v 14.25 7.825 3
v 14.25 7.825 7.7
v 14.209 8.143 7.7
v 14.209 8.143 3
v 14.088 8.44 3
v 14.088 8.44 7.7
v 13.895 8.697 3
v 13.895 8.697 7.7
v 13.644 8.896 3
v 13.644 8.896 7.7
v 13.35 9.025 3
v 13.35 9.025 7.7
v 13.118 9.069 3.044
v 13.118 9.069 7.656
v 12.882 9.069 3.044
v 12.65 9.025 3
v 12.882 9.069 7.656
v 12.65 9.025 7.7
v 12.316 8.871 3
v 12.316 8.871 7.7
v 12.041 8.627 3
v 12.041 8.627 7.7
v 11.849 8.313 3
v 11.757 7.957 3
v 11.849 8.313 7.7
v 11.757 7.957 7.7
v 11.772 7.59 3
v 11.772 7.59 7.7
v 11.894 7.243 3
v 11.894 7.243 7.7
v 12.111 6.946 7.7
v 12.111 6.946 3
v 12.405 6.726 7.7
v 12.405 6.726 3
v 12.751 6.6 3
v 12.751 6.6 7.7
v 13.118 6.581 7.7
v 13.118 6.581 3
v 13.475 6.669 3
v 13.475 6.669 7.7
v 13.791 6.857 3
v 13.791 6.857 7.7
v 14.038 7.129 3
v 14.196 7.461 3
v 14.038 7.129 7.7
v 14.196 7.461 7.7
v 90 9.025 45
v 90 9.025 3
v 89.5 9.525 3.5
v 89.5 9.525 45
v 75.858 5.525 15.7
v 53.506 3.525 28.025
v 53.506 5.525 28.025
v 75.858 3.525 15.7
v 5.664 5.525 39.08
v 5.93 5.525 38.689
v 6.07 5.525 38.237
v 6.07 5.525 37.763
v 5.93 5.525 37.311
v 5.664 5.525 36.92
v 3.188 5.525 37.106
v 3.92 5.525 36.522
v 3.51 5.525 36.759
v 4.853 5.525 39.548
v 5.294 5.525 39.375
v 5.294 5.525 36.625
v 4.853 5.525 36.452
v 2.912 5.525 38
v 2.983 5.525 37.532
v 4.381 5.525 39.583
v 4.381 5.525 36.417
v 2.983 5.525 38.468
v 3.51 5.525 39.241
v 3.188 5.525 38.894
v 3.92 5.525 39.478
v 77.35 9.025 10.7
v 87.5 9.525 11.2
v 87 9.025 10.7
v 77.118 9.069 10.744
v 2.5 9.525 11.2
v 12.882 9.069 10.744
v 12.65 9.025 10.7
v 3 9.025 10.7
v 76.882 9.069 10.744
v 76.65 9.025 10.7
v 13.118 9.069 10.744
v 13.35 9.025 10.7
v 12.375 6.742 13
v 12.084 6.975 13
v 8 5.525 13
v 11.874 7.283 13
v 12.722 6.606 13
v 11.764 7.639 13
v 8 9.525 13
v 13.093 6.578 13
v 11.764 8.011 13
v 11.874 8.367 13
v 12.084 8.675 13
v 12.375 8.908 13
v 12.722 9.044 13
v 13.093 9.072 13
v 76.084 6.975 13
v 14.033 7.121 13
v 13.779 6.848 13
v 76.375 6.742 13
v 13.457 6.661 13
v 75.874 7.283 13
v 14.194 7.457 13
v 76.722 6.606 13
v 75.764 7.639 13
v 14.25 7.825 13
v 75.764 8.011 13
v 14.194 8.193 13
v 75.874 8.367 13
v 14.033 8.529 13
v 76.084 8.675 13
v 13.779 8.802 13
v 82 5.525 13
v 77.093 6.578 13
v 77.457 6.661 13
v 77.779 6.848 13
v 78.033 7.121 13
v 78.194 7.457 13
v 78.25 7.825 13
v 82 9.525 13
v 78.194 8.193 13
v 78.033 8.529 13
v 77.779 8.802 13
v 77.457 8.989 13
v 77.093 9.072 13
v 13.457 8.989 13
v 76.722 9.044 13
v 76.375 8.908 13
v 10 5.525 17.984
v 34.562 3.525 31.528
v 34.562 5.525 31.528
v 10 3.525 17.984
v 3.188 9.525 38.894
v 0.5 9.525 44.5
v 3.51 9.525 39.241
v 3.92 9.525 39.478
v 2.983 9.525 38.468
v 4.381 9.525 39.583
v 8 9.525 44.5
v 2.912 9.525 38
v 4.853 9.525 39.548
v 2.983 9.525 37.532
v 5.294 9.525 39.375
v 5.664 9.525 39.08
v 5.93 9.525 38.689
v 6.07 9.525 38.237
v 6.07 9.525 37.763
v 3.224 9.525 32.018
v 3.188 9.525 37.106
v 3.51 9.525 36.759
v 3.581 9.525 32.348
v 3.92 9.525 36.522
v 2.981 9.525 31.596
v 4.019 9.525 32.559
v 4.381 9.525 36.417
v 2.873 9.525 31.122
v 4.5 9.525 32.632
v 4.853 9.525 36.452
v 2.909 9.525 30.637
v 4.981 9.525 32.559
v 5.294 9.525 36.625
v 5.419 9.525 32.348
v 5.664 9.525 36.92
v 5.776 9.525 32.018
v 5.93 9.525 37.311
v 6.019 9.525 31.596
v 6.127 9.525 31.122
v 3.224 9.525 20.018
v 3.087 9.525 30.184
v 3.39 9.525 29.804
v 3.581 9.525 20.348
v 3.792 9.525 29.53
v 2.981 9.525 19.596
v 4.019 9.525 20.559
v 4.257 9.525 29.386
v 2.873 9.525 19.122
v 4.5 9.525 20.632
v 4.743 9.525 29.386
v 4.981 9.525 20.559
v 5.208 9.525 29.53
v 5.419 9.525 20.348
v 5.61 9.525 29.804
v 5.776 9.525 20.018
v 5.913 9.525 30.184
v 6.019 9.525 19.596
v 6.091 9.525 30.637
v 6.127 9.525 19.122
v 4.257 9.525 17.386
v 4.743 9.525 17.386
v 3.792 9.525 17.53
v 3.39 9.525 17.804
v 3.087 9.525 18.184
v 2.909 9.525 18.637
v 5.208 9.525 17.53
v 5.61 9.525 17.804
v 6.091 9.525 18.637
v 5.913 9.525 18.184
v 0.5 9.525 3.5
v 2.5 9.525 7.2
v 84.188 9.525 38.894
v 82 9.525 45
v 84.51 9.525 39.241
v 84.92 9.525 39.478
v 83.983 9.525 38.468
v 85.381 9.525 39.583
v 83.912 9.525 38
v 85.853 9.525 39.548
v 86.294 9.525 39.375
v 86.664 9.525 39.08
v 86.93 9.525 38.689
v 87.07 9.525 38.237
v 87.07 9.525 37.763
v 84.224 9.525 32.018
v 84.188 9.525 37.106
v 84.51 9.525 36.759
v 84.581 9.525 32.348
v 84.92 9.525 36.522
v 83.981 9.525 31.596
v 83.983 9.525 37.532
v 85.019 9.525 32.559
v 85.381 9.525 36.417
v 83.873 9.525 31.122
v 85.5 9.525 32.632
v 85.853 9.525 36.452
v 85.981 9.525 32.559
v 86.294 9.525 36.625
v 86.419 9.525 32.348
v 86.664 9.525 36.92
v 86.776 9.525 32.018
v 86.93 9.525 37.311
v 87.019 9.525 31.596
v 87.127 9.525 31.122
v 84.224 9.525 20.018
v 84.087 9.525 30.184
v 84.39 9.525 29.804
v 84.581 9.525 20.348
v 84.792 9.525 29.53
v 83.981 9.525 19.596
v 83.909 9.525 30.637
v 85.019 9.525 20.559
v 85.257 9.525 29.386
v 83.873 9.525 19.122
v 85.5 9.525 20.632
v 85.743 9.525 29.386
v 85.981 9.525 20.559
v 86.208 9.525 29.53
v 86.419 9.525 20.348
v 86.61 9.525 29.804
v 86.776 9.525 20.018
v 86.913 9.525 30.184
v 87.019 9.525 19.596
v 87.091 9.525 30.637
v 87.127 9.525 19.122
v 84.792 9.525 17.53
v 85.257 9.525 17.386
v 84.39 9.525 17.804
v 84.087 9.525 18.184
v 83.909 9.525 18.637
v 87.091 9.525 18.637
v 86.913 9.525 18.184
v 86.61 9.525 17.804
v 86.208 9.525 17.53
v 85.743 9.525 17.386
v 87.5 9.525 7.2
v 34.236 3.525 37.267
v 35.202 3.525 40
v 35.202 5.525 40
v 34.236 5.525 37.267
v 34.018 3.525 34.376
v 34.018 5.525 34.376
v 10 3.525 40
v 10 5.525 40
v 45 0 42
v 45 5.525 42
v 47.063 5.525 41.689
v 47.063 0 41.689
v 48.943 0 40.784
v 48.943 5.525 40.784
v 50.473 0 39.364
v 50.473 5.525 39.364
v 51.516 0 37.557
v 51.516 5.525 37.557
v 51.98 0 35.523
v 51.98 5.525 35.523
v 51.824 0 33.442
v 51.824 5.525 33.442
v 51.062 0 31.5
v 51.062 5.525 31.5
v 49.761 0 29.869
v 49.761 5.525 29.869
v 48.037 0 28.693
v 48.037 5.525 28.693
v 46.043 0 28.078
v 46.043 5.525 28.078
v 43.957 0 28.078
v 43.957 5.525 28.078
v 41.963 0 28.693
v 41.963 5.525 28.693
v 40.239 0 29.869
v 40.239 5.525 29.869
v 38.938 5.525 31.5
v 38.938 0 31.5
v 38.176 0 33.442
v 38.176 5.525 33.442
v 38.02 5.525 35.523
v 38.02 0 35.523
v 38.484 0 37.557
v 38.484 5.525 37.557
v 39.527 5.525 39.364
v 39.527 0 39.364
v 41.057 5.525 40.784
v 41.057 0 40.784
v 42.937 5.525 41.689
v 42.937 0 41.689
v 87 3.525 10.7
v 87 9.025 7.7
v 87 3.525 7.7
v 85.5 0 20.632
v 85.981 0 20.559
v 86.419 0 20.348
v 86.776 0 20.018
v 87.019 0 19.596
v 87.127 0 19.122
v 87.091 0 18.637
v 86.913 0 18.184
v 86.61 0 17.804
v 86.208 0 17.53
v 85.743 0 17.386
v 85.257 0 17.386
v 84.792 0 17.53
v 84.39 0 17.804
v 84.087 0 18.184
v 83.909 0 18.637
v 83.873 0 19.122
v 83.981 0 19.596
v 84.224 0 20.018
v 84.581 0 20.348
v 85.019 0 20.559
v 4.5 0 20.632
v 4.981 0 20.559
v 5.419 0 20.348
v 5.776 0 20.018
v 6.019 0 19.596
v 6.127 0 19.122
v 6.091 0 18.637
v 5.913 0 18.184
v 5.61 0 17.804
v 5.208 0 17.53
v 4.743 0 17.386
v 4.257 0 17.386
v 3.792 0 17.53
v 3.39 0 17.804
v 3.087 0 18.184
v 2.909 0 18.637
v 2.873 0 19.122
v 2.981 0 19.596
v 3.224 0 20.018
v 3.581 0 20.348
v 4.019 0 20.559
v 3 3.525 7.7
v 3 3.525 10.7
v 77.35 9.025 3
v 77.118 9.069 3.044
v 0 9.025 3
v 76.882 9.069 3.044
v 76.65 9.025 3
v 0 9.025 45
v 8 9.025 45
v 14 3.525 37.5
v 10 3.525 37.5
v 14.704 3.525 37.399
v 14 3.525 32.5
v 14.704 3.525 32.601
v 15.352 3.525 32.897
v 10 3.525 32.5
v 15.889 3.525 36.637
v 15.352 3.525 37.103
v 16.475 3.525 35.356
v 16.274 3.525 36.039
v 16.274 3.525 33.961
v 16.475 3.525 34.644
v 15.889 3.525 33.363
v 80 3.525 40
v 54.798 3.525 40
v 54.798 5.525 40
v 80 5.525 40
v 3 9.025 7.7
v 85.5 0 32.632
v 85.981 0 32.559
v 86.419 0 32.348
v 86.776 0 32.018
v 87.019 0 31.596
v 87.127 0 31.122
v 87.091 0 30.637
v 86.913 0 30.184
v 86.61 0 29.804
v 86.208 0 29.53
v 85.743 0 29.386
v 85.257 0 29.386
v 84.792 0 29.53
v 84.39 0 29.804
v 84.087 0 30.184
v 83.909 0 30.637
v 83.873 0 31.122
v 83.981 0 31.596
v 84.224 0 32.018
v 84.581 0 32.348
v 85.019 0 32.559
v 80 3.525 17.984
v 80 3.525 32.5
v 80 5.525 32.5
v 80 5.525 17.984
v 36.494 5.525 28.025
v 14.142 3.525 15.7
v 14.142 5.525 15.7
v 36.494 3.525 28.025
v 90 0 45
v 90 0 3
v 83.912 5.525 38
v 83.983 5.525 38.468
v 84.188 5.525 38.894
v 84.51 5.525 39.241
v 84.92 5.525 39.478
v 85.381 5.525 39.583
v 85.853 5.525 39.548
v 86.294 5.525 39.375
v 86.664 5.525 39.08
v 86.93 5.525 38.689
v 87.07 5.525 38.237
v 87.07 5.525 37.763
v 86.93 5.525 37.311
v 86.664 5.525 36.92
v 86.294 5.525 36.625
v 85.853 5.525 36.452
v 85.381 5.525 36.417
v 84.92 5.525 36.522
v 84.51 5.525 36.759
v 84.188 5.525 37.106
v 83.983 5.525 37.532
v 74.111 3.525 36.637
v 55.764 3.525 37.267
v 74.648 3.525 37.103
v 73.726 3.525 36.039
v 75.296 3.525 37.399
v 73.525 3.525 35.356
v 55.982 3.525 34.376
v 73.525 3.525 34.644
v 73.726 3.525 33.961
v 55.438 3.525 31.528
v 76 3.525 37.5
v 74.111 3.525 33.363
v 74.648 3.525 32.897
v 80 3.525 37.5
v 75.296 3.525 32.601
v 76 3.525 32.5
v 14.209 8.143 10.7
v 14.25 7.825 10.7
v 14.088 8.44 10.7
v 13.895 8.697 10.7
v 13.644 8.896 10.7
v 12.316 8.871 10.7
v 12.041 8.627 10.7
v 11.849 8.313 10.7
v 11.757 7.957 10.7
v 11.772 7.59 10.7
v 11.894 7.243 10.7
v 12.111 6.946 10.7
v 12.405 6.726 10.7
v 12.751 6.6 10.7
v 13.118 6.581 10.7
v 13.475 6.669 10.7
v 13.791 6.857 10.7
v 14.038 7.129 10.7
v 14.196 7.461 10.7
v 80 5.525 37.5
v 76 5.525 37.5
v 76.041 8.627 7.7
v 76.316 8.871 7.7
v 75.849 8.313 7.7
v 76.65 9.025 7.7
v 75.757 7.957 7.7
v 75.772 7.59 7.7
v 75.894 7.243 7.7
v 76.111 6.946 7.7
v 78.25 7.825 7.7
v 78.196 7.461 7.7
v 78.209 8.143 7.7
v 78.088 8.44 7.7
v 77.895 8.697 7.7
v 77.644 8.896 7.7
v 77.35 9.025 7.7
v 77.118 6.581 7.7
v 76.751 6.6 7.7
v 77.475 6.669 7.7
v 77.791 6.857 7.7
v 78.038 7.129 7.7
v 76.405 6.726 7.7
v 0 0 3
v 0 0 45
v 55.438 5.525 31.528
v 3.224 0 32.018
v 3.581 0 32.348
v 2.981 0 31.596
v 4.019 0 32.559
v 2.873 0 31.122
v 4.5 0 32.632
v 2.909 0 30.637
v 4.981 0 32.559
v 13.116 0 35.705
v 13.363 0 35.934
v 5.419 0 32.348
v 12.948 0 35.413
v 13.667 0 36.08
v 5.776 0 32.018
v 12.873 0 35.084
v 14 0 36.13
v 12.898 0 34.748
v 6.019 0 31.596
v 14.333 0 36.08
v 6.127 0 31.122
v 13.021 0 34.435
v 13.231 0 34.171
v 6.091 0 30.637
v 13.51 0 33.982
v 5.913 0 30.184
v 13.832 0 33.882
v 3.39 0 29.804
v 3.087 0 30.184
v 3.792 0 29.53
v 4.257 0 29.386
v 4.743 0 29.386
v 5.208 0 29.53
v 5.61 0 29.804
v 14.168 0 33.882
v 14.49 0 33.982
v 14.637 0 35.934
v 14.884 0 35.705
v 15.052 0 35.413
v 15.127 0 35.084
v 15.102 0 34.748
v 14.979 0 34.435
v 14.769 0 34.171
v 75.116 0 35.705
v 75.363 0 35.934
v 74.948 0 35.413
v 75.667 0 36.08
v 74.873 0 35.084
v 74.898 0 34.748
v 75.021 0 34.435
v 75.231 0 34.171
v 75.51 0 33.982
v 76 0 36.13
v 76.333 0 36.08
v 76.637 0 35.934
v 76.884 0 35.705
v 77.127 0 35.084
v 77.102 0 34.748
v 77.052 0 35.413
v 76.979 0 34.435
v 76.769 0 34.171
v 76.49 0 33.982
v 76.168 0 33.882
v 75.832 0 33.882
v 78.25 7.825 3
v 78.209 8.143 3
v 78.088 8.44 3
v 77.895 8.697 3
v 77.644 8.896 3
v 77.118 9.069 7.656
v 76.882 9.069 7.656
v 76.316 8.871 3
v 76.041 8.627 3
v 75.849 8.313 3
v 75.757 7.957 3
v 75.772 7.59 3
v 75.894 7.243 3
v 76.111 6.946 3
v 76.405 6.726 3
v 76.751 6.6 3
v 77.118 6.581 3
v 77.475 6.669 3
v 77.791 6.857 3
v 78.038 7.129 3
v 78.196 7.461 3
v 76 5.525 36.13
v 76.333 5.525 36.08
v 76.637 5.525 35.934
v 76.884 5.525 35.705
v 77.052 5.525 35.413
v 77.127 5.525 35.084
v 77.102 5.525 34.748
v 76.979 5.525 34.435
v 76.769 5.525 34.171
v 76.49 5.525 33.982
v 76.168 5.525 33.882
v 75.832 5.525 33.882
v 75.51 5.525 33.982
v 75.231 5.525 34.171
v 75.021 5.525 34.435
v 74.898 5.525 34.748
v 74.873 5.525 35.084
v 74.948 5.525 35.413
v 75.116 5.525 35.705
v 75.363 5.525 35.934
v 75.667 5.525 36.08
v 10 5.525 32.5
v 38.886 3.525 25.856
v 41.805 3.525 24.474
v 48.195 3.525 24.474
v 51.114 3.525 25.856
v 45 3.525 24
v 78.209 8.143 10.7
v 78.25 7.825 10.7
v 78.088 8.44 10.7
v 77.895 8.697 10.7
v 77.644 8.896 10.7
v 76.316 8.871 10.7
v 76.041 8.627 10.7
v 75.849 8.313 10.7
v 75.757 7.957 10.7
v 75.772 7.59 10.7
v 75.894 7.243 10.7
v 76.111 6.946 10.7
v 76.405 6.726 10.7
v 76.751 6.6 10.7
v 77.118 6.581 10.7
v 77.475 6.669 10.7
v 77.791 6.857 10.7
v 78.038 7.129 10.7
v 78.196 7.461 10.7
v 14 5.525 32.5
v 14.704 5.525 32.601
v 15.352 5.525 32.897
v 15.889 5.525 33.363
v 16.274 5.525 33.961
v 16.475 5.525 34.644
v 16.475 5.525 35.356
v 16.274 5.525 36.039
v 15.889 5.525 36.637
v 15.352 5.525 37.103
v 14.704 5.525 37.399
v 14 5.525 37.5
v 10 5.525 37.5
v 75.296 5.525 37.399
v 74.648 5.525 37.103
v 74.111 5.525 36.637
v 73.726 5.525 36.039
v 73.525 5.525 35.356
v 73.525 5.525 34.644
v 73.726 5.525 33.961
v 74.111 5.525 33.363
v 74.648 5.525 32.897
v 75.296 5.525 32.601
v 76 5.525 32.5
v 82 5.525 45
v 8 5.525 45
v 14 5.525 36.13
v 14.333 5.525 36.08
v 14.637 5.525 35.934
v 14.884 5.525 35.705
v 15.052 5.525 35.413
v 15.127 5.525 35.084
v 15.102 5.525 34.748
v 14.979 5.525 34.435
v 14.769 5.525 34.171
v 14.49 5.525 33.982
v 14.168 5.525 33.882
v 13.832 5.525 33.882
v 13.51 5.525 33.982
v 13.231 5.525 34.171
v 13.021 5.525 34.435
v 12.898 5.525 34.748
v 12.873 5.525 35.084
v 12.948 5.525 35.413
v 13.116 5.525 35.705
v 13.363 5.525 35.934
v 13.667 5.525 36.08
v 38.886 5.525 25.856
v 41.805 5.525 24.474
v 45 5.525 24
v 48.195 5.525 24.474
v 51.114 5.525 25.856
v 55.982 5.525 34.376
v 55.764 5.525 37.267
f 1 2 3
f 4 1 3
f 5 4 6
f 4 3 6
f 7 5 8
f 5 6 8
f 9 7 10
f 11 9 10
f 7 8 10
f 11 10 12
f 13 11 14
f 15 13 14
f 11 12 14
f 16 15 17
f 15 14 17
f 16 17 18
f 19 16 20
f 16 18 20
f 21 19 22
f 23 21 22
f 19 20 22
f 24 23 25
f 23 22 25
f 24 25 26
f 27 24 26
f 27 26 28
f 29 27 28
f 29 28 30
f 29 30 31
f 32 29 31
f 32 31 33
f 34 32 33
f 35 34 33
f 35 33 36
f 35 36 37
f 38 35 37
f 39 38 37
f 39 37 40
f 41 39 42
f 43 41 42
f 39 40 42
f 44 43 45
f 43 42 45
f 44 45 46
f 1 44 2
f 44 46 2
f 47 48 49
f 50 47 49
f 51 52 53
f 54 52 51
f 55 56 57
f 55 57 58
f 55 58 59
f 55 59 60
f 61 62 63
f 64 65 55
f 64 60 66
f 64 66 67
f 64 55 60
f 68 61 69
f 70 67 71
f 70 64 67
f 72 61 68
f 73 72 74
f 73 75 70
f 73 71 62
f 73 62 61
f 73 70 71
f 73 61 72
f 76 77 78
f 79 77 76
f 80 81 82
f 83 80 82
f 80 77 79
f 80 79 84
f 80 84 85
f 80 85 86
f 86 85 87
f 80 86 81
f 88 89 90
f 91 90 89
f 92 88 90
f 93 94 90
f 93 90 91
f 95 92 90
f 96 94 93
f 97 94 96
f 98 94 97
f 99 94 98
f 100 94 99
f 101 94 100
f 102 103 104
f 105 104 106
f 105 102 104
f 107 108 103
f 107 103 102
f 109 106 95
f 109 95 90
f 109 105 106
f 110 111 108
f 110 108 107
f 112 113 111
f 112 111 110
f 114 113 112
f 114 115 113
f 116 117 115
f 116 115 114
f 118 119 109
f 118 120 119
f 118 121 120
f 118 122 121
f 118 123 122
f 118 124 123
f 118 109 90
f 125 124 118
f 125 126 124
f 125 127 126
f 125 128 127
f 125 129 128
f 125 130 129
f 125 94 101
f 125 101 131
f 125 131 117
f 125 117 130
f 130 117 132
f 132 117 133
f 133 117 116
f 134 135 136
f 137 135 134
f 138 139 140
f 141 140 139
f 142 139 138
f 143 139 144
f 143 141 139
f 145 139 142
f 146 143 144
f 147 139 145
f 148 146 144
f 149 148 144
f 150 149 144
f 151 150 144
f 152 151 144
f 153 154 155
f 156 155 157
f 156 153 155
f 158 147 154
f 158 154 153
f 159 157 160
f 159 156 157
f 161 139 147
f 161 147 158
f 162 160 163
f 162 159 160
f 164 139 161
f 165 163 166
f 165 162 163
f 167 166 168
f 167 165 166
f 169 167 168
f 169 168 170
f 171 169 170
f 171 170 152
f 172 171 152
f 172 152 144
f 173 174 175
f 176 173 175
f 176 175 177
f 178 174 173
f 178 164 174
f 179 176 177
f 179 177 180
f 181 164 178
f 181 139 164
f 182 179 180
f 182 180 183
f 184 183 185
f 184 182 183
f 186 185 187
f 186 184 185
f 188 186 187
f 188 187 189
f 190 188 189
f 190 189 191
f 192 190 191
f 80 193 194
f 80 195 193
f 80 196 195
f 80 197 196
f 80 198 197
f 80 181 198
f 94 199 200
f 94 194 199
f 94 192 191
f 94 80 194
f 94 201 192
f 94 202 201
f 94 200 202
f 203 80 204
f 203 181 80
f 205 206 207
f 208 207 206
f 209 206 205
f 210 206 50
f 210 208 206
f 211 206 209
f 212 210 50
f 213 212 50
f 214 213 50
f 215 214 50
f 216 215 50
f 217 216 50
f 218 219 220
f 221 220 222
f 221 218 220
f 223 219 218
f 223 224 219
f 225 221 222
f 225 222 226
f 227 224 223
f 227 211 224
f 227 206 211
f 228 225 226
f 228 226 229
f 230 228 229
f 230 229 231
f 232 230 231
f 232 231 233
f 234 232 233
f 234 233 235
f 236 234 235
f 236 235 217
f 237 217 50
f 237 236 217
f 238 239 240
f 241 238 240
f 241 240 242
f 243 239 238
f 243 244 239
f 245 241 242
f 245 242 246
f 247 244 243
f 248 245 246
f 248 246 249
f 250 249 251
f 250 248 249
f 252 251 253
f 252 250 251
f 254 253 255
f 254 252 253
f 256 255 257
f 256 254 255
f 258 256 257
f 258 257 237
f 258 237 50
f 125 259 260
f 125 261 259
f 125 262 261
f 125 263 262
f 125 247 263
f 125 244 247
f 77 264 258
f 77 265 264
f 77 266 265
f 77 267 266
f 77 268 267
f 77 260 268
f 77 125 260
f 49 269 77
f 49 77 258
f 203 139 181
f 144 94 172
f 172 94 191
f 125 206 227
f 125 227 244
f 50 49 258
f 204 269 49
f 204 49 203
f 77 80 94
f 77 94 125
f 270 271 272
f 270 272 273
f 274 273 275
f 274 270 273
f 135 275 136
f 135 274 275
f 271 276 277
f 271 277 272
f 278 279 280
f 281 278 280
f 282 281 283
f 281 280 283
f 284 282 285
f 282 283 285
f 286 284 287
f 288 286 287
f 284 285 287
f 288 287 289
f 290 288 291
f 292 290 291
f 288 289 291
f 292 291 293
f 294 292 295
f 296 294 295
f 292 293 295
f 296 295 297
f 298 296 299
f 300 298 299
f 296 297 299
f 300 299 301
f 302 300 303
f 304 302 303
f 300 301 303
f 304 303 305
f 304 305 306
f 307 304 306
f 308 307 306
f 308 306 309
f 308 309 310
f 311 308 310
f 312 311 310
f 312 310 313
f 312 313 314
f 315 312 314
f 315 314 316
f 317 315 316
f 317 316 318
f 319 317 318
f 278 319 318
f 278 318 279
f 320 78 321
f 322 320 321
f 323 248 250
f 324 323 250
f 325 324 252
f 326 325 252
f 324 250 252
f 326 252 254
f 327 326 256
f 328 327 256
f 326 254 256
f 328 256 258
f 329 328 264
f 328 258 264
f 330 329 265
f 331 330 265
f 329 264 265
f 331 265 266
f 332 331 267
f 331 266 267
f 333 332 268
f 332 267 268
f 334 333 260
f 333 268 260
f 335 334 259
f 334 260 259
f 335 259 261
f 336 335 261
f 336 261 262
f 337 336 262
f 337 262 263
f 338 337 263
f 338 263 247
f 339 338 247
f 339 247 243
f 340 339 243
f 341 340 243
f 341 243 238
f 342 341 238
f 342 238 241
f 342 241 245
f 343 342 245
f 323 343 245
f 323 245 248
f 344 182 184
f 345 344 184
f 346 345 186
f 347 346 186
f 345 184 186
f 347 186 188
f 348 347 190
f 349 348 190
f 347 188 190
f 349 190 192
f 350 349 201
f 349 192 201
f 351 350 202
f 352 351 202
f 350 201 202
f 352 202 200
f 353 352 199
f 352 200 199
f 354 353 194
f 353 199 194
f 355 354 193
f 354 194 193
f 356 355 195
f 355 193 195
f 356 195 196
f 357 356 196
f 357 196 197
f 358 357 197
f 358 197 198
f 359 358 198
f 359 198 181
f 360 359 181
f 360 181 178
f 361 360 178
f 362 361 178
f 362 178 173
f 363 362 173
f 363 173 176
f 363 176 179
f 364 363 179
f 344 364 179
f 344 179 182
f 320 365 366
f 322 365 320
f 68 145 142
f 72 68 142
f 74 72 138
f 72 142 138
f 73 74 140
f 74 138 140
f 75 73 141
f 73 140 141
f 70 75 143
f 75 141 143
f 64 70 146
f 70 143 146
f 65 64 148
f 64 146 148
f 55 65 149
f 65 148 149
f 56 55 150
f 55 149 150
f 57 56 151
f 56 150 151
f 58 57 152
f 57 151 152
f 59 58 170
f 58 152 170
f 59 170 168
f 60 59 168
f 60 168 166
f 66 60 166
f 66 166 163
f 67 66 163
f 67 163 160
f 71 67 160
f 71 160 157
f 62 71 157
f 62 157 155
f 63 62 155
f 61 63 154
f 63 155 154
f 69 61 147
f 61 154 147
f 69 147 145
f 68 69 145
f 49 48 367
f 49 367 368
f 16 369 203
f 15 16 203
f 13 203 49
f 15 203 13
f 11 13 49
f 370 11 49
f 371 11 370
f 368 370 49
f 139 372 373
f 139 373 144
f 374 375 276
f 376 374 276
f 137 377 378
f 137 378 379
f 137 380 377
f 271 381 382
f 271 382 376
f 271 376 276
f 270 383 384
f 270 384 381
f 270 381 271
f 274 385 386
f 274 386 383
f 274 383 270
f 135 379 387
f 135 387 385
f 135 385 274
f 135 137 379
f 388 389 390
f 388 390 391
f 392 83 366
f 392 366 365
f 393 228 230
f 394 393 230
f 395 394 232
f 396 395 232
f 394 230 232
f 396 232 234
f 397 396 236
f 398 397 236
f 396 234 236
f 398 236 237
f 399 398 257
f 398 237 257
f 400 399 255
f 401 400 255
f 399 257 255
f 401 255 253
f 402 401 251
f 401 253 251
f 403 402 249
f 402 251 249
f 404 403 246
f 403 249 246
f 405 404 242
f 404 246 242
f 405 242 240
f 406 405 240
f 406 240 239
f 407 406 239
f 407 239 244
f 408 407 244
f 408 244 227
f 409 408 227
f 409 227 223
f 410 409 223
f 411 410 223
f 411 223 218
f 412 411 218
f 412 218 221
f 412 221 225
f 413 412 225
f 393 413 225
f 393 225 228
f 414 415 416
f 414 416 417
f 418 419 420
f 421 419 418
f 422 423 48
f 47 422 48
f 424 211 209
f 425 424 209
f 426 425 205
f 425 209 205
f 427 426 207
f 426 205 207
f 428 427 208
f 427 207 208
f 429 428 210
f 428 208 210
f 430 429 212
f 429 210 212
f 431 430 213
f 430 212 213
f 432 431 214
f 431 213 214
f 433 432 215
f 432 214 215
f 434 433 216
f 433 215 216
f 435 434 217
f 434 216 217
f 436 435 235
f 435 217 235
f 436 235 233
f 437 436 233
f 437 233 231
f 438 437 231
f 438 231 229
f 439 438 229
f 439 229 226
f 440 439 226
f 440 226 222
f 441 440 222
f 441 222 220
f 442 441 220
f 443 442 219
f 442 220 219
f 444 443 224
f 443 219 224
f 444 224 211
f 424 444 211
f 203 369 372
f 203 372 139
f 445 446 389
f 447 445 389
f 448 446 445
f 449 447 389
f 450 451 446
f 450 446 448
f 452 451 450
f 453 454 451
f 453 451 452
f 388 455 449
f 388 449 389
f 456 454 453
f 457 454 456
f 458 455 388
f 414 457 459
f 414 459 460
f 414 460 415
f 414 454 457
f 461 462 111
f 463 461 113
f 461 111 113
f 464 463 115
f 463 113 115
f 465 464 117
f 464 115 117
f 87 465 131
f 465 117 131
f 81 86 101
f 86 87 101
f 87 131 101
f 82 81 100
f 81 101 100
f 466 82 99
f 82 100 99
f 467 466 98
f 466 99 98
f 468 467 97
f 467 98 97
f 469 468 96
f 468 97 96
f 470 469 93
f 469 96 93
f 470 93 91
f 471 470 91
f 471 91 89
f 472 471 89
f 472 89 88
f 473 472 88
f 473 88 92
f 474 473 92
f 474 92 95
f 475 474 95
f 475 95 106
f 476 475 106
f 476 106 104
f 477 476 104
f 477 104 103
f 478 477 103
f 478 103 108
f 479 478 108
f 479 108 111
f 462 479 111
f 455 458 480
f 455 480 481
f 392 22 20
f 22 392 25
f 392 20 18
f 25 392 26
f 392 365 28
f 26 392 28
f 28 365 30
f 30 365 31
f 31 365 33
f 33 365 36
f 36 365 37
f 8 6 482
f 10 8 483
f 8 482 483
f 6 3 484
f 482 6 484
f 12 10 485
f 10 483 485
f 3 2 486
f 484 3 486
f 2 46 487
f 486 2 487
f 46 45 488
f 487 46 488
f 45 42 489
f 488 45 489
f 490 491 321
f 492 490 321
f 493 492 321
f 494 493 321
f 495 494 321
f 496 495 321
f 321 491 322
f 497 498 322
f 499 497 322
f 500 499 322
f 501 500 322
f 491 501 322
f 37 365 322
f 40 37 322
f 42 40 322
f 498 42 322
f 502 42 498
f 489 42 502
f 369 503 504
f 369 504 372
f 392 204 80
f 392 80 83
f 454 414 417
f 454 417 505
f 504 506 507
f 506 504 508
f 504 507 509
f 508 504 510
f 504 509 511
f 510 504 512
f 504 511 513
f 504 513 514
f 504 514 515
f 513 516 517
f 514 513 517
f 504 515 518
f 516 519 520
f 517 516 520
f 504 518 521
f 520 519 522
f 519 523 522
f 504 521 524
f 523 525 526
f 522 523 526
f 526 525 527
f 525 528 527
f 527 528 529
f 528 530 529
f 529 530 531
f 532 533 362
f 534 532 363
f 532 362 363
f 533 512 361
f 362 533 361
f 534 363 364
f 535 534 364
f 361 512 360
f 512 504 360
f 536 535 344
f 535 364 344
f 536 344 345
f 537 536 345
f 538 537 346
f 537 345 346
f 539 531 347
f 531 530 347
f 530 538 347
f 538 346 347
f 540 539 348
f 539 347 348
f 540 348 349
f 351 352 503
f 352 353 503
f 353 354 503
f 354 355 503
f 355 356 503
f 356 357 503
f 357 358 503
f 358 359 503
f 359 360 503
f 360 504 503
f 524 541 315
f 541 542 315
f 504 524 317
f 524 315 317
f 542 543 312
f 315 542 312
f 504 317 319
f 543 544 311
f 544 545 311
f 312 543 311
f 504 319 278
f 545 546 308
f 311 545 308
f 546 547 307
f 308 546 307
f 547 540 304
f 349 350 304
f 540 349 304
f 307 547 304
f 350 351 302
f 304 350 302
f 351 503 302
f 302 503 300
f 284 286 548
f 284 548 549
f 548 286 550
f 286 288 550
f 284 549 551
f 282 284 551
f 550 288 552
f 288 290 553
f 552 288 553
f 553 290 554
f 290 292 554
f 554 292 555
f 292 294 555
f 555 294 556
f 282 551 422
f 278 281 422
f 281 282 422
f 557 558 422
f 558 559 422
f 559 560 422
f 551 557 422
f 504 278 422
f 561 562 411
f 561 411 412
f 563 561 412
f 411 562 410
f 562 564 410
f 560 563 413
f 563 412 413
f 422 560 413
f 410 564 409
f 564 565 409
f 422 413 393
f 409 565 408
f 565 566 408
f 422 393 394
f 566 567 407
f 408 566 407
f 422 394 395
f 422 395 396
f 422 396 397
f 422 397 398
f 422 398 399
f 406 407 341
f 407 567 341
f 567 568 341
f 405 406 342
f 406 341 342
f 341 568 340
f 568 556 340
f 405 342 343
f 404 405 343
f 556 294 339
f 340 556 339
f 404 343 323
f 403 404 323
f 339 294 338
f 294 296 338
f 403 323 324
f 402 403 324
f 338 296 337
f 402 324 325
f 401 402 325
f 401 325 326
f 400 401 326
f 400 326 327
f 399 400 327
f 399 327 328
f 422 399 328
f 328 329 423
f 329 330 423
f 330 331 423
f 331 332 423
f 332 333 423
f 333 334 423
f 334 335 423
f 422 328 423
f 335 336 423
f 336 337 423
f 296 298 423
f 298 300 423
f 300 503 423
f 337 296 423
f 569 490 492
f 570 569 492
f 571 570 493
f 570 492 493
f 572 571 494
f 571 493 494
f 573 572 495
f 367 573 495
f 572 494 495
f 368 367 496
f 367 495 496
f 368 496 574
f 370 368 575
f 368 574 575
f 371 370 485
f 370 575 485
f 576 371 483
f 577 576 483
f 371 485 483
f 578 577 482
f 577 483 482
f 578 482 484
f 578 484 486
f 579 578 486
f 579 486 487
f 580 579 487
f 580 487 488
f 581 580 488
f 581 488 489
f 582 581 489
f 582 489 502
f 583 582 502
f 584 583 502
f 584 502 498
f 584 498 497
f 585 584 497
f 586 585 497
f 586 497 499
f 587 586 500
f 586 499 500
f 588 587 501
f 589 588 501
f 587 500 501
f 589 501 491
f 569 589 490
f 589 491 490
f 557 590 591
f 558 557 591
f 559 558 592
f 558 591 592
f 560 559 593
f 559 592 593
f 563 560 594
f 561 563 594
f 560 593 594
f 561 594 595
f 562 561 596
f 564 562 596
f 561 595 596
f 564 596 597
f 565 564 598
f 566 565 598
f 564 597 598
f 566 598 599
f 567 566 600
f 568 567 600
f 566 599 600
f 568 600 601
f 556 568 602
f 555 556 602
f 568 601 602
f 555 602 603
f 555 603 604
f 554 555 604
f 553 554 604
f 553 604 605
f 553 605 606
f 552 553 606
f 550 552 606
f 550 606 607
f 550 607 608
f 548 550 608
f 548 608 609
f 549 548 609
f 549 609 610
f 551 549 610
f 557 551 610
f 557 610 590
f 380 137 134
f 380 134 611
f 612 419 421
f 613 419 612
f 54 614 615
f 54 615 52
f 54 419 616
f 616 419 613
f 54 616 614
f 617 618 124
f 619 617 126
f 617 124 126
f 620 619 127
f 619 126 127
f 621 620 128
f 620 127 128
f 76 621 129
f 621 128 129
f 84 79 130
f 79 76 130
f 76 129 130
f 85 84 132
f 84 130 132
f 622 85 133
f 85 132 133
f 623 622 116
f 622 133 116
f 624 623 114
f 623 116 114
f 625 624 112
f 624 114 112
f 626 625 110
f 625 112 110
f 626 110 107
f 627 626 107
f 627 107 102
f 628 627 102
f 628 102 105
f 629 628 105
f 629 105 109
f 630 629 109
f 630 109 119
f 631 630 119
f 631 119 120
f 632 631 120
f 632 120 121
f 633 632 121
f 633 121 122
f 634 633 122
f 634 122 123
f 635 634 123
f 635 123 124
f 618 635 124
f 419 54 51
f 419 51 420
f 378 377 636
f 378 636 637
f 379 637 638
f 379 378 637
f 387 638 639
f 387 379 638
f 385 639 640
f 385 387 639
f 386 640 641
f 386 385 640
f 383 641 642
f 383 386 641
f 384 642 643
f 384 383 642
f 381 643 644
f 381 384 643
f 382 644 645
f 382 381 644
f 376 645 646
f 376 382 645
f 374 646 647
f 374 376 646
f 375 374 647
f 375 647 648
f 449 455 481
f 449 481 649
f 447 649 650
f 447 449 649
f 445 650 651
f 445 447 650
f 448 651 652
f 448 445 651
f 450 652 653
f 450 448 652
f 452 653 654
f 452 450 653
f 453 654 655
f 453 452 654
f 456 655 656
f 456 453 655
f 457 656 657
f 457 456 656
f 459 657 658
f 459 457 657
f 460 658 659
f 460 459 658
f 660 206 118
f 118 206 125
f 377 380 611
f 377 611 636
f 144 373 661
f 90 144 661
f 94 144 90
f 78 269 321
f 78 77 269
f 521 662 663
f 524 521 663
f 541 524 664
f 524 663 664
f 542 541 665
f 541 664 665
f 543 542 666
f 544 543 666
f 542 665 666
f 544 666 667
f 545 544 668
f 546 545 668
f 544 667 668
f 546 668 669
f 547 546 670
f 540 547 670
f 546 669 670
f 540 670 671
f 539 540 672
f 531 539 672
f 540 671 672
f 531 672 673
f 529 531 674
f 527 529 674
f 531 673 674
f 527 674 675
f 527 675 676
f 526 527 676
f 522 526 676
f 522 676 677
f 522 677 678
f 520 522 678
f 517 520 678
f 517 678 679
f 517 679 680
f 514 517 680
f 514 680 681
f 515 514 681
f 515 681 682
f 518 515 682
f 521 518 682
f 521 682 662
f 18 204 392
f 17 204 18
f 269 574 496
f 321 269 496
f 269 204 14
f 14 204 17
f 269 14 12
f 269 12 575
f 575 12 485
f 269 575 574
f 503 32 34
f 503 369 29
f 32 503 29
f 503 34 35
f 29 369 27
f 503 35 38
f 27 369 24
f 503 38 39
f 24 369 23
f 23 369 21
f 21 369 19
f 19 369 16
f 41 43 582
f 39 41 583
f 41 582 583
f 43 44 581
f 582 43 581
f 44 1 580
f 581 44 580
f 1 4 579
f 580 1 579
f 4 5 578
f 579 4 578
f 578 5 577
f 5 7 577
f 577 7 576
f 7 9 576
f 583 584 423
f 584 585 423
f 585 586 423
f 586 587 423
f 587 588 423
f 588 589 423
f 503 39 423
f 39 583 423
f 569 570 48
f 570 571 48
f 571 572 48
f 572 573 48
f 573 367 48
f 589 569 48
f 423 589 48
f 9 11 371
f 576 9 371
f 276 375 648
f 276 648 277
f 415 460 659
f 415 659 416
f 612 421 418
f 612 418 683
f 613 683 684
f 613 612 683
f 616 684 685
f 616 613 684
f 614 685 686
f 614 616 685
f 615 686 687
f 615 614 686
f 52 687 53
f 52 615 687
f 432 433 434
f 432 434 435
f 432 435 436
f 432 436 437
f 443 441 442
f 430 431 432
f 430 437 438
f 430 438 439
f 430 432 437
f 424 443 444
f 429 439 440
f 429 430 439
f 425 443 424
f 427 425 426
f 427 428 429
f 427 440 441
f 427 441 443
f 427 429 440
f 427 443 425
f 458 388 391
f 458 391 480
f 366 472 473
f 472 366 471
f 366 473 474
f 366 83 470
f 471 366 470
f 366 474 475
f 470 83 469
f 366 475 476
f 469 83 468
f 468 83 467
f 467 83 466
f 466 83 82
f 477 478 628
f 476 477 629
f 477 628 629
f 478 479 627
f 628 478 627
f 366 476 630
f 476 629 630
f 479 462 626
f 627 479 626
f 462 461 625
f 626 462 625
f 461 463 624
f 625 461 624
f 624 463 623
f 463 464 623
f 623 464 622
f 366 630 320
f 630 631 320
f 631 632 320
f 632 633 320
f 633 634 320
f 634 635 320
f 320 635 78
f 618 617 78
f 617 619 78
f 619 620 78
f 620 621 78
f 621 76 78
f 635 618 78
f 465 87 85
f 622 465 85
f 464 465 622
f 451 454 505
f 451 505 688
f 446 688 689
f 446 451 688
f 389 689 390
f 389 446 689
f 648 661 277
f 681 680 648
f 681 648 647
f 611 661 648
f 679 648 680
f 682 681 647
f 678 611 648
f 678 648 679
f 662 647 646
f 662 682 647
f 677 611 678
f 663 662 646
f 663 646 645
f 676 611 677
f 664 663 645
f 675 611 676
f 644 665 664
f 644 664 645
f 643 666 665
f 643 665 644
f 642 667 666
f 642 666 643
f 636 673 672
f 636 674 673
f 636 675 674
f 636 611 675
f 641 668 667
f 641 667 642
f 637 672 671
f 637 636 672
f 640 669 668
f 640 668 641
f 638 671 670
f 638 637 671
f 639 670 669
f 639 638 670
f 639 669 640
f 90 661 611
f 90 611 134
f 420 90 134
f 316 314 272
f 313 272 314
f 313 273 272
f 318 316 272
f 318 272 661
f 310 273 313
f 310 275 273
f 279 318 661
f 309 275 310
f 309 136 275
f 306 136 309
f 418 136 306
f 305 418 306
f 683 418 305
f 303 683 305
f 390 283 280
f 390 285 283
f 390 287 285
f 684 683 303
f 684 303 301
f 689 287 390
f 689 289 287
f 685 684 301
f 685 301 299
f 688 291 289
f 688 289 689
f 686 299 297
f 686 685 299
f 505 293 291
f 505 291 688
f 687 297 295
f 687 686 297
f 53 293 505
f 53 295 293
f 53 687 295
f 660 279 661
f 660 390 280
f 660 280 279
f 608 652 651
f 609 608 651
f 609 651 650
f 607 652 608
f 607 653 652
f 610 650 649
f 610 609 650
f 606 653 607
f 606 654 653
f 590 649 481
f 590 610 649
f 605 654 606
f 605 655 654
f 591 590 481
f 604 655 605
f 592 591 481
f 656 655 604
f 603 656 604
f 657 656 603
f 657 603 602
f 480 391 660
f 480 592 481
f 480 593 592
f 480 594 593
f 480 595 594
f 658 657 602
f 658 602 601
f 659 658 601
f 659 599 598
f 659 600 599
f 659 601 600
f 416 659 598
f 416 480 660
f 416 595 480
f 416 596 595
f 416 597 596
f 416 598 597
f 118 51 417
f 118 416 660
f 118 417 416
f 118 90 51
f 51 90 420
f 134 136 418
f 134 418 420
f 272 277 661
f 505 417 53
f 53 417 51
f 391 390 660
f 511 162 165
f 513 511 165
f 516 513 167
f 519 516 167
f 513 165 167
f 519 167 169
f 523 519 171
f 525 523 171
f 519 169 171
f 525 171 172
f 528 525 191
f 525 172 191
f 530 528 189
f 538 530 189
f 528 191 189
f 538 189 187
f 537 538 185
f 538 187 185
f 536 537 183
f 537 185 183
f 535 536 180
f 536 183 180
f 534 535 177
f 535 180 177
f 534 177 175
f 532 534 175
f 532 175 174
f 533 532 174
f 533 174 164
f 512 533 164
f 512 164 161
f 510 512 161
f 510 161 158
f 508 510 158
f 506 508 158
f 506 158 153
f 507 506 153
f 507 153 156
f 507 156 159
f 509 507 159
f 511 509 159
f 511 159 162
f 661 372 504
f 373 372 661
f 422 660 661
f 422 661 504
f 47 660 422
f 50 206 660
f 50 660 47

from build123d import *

# Parameters (mm, degrees)
SKETCH1_W               = 90
SKETCH1_H               = 9.525
SKETCH1_R               = 2
BOSS_EXTRUDE1_DEPTH     = 45
SKETCH2_R               = 7
CUT_EXTRUDE2_DEPTH      = 10
SKETCH3_R               = 1.63195
SKETCH3_R_2             = 7
SKETCH3_R_3             = 1.1303
CUT_EXTRUDE3_DEPTH      = 10
SKETCH4_W               = 84
SKETCH4_H               = 3
CUT_EXTRUDE4_DEPTH      = 6
CUT_EXTRUDE6_DEPTH      = 102.072872844
CUT_EXTRUDE6_DEPTH_BACK = 6
SKETCH7_W               = 90
SKETCH7_H               = 3
CUT_EXTRUDE7_DEPTH      = 10
SKETCH9_W               = 74
SKETCH9_H               = 32
CUT_EXTRUDE8_DEPTH      = 4
CUT_EXTRUDE9_REACH      = 97.993
SKETCH10_R              = 1.25
CHAMFER2_SIZE           = 0.5
SKETCH11_R              = 1.5875
CUT_EXTRUDE10_DEPTH     = 4


with BuildPart() as part:
    # Sketch1 → Boss-Extrude1 (new body)
    # profile 1 of 3: a face of its own
    with BuildSketch(Plane.XY):
        with Locations((45, 4.7625)):
            Rectangle(SKETCH1_W, SKETCH1_H)
        with Locations((60, 4.7625)):
            Circle(SKETCH1_R, mode=Mode.SUBTRACT)
        with Locations((30, 4.7625)):
            Circle(SKETCH1_R, mode=Mode.SUBTRACT)
    # profile 2 of 3: a face of its own
    with BuildSketch(Plane.XY):
        with Locations((30, 4.7625)):
            Circle(SKETCH1_R)
    # profile 3 of 3: a face of its own
    with BuildSketch(Plane.XY):
        with Locations((60, 4.7625)):
            Circle(SKETCH1_R)
    extrude(amount=BOSS_EXTRUDE1_DEPTH)

    # Sketch2 → Cut-Extrude2 (cut)
    with BuildSketch(Plane(origin=(0, 9.525, 0), x_dir=(1, 0, 0), z_dir=(0, 1, 0))):
        with Locations(Location((45, -35, 0), (0, 0, 270))):
            Circle(SKETCH2_R)
    extrude(amount=-CUT_EXTRUDE2_DEPTH, mode=Mode.SUBTRACT)

    # Sketch3 → Cut-Extrude3 (cut)
    with BuildSketch(Plane(origin=(0, 9.525, 0), x_dir=(1, 0, 0), z_dir=(0, 1, 0))):
        with Locations(Location((85.5, -31, 0), (0, 0, 270))):
            Circle(SKETCH3_R)
        with Locations(Location((4.5, -31, 0), (0, 0, 270))):
            Circle(SKETCH3_R)
        with Locations(Location((45, -35, 0), (0, 0, 270))):
            Circle(SKETCH3_R_2)
        with Locations(Location((85.5, -19, 0), (0, 0, 270))):
            Circle(SKETCH3_R)
        with Locations(Location((4.5, -19, 0), (0, 0, 270))):
            Circle(SKETCH3_R)
        with Locations(Location((76, -35, 0), (0, 0, 270))):
            Circle(SKETCH3_R_3)
        with Locations(Location((14, -35, 0), (0, 0, 270))):
            Circle(SKETCH3_R_3)
    extrude(amount=-CUT_EXTRUDE3_DEPTH, mode=Mode.SUBTRACT)

    # Sketch4 → Cut-Extrude4 (cut)
    with BuildSketch(Plane(origin=(0, 9.525, 0), x_dir=(1, 0, 0), z_dir=(0, 1, 0))):
        with Locations((45, -9.2)):
            Rectangle(SKETCH4_W, SKETCH4_H)
    extrude(amount=-CUT_EXTRUDE4_DEPTH, mode=Mode.SUBTRACT)

    # Sketch6 → Cut-Extrude6 (cut, two sides: drawn at the far end of the back side and taken through both)
    with BuildSketch(Plane(origin=(0, 9.525, 0), x_dir=(1, 0, 0), z_dir=(0, 1, 0)).offset(-CUT_EXTRUDE6_DEPTH_BACK)):
        with BuildLine():
            ThreePointArc((14, -32.5), (16.5, -35), (14, -37.5))
            Line((14, -37.5), (10, -37.5))
            Line((10, -37.5), (10, -40))
            Line((10, -40), (35.202041029, -40))
            ThreePointArc((35.202041029, -40), (34.031236019, -35.828381989), (34.562237569, -31.528240298))
            Line((34.562237569, -31.528240298), (10, -17.983920725))
            Line((10, -17.983920725), (10, -32.5))
            Line((10, -32.5), (14, -32.5))
        make_face()
        with BuildLine():
            Line((14.141825149, -15.7), (36.493753196, -28.025491752))
            ThreePointArc((36.493753196, -28.025491752), (45, -24), (53.506246804, -28.025491752))
            Line((53.506246804, -28.025491752), (75.858174851, -15.7))
            Line((75.858174851, -15.7), (14.141825149, -15.7))
        make_face()
        with BuildLine():
            ThreePointArc((55.437762431, -31.528240298), (55.968763981, -35.828381989), (54.797958971, -40))
            Line((54.797958971, -40), (80, -40))
            Line((80, -40), (80, -37.5))
            Line((80, -37.5), (76, -37.5))
            ThreePointArc((76, -37.5), (73.5, -35), (76, -32.5))
            Line((76, -32.5), (80, -32.5))
            Line((80, -32.5), (80, -17.983920725))
            Line((80, -17.983920725), (55.437762431, -31.528240298))
        make_face()
    extrude(amount=CUT_EXTRUDE6_DEPTH + CUT_EXTRUDE6_DEPTH_BACK, mode=Mode.SUBTRACT)

    # Sketch7 → Cut-Extrude7 (cut)
    with BuildSketch(Plane(origin=(0, 9.525, 0), x_dir=(1, 0, 0), z_dir=(0, 1, 0))):
        with Locations((45, -1.5)):
            Rectangle(SKETCH7_W, SKETCH7_H)
    extrude(amount=-CUT_EXTRUDE7_DEPTH, mode=Mode.SUBTRACT)

    # Sketch9 → Cut-Extrude8 (cut)
    with BuildSketch(Plane(origin=(0, 9.525, 0), x_dir=(1, 0, 0), z_dir=(0, 1, 0))):
        with Locations((45, -29)):
            Rectangle(SKETCH9_W, SKETCH9_H)
    extrude(amount=-CUT_EXTRUDE8_DEPTH, mode=Mode.SUBTRACT)

    # Cut-Extrude9: up to this face of the body (flat: up to its plane)
    cut_extrude9_end = Plane(part.part.faces().sort_by_distance((45, 4.7625, 3))[0])
    # Sketch10 → Cut-Extrude9 (cut, up to the picked face)
    with BuildSketch(Plane.XY.offset(13), mode=Mode.PRIVATE) as cut_extrude9_sk1:
        with Locations((77, 7.825)):
            Circle(SKETCH10_R)
    cut_extrude9_tool1 = split(extrude(cut_extrude9_sk1.sketch, amount=-CUT_EXTRUDE9_REACH, mode=Mode.PRIVATE), bisect_by=cut_extrude9_end, keep=Keep.BOTH, mode=Mode.PRIVATE)
    # Sketch10 → Cut-Extrude9 (cut, up to the picked face)
    with BuildSketch(Plane.XY.offset(13), mode=Mode.PRIVATE) as cut_extrude9_sk2:
        with Locations((13, 7.825)):
            Circle(SKETCH10_R)
    cut_extrude9_tool2 = split(extrude(cut_extrude9_sk2.sketch, amount=-CUT_EXTRUDE9_REACH, mode=Mode.PRIVATE), bisect_by=cut_extrude9_end, keep=Keep.BOTH, mode=Mode.PRIVATE)
    add(cut_extrude9_tool1.solids().sort_by(Axis((77, 7.825, 13), (0, 0, -1)))[0], mode=Mode.SUBTRACT)
    add(cut_extrude9_tool2.solids().sort_by(Axis((13, 7.825, 13), (0, 0, -1)))[0], mode=Mode.SUBTRACT)

    # Chamfer2
    # the kernel refuses this chamfer: 0.5 mm, written as the material it takes off along each edge
    with BuildSketch(Plane(origin=(9.285841494, 9.525, 45), x_dir=(0, -0.999621916911297, 0.0274958766105822), z_dir=(-1, 0, 0))) as chamfer2_piece_1:
        Polygon((CHAMFER2_SIZE * 0.999621916911, -CHAMFER2_SIZE * 0.0274958766106), (-CHAMFER2_SIZE * 0.0274958766106, -CHAMFER2_SIZE * 0.999621916911), (0, 0), align=None)
    extrude(amount=10.571682988, mode=Mode.SUBTRACT)
    with BuildSketch(Plane(origin=(-1.285841494, 9.525, 3), x_dir=(0, -0.9996219169112968, -0.02749587661058651), z_dir=(1, 0, 0))) as chamfer2_piece_2:
        Polygon((CHAMFER2_SIZE * 0.999621916911, -CHAMFER2_SIZE * 0.0274958766106), (-CHAMFER2_SIZE * 0.0274958766106, -CHAMFER2_SIZE * 0.999621916911), (0, 0), align=None)
    extrude(amount=92.571682988, mode=Mode.SUBTRACT)
    with BuildSketch(Plane(origin=(87, 9.525, 10.7), x_dir=(0.999621916911297, 0.027495876610582292, 0), z_dir=(0, 0, -1)), Plane(origin=(3, 9.525, 7.7), x_dir=(-0.9996219169112968, 0.027495876610585408, -1.1837901526131803e-15), z_dir=(0, 0, 1))) as chamfer2_piece_3:
        Polygon((CHAMFER2_SIZE * 0.999621916911, CHAMFER2_SIZE * 0.0274958766106), (-CHAMFER2_SIZE * 0.0274958766106, CHAMFER2_SIZE * 0.999621916911), (0, 0), align=None)
    extrude(amount=3, mode=Mode.SUBTRACT)
    with BuildSketch(Plane(origin=(87, 9.525, 7.7), x_dir=(0, 0.0274958766105822, -0.999621916911297), z_dir=(-1, 0, 0)), Plane(origin=(3, 9.525, 10.7), x_dir=(0, 0.027495876610585647, 0.9996219169112968), z_dir=(1, 0, 0))) as chamfer2_piece_4:
        Polygon((CHAMFER2_SIZE * 0.999621916911, CHAMFER2_SIZE * 0.0274958766106), (-CHAMFER2_SIZE * 0.0274958766106, CHAMFER2_SIZE * 0.999621916911), (0, 0), align=None)
    extrude(amount=84, mode=Mode.SUBTRACT)
    with BuildSketch(Plane(origin=(0, 9.525, 1.714158506), x_dir=(-0.02749587661058639, -0.9996219169112968, 0), z_dir=(0, 0, 1))) as chamfer2_piece_5:
        Polygon((CHAMFER2_SIZE * 0.999621916911, CHAMFER2_SIZE * 0.0274958766106), (-CHAMFER2_SIZE * 0.0274958766106, CHAMFER2_SIZE * 0.999621916911), (0, 0), align=None)
    extrude(amount=44.571682988, mode=Mode.SUBTRACT)
    with BuildSketch(Plane(origin=(90, 9.525, 1.714158506), x_dir=(0.0274958766105822, -0.999621916911297, 0), z_dir=(0, 0, 1))) as chamfer2_piece_6:
        Polygon((CHAMFER2_SIZE * 0.999621916911, -CHAMFER2_SIZE * 0.0274958766106), (-CHAMFER2_SIZE * 0.0274958766106, -CHAMFER2_SIZE * 0.999621916911), (0, 0), align=None)
    extrude(amount=44.571682988, mode=Mode.SUBTRACT)
    with BuildSketch(Plane(origin=(87, 9.525, 11.985841494), x_dir=(0.9996219169112968, 0.02749587661058574, 0), z_dir=(0, 0, -1))) as chamfer2_piece_7a_section:
        Polygon((CHAMFER2_SIZE * 0.999621916911, CHAMFER2_SIZE * 0.0274958766106), (-CHAMFER2_SIZE * 0.0274958766106, CHAMFER2_SIZE * 0.999621916911), (0, 0), align=None)
    chamfer2_piece_7a = extrude(amount=4.285841494, mode=Mode.PRIVATE)
    chamfer2_piece_7a = split(chamfer2_piece_7a, bisect_by=Plane(origin=(87.164896813, 9.360103187, 10.7), z_dir=(0, 0, 1)), keep=Keep.TOP, mode=Mode.PRIVATE)
    with BuildSketch(Plane(origin=(3, 9.525, 10.7), x_dir=(0, 0.027495876610585647, 0.9996219169112968), z_dir=(1, 0, 0))) as chamfer2_piece_7b_section:
        Polygon((CHAMFER2_SIZE * 0.999621916911, CHAMFER2_SIZE * 0.0274958766106), (-CHAMFER2_SIZE * 0.0274958766106, CHAMFER2_SIZE * 0.999621916911), (0, 0), align=None)
    chamfer2_piece_7b = extrude(amount=85.285841494, mode=Mode.PRIVATE)
    chamfer2_piece_7b = split(chamfer2_piece_7b, bisect_by=Plane(origin=(87, 9.360103187, 10.864896813), z_dir=(1, 0, 0)), keep=Keep.TOP, mode=Mode.PRIVATE)
    chamfer2_piece_7 = chamfer2_piece_7a & chamfer2_piece_7b
    add(chamfer2_piece_7, mode=Mode.SUBTRACT)
    with BuildSketch(Plane(origin=(87, 9.525, 10.7), x_dir=(0.999621916911297, 0.027495876610582292, 0), z_dir=(0, 0, -1))) as chamfer2_piece_8a_section:
        Polygon((CHAMFER2_SIZE * 0.999621916911, CHAMFER2_SIZE * 0.0274958766106), (-CHAMFER2_SIZE * 0.0274958766106, CHAMFER2_SIZE * 0.999621916911), (0, 0), align=None)
    chamfer2_piece_8a = extrude(amount=4.285841494, mode=Mode.PRIVATE)
    chamfer2_piece_8a = split(chamfer2_piece_8a, bisect_by=Plane(origin=(87.164896813, 9.360103187, 7.7), z_dir=(0, 0, -1)), keep=Keep.TOP, mode=Mode.PRIVATE)
    with BuildSketch(Plane(origin=(88.285841494, 9.525, 7.7), x_dir=(0, 0.027495876610585647, -0.9996219169112968), z_dir=(-1, 0, 0))) as chamfer2_piece_8b_section:
        Polygon((CHAMFER2_SIZE * 0.999621916911, CHAMFER2_SIZE * 0.0274958766106), (-CHAMFER2_SIZE * 0.0274958766106, CHAMFER2_SIZE * 0.999621916911), (0, 0), align=None)
    chamfer2_piece_8b = extrude(amount=85.285841494, mode=Mode.PRIVATE)
    chamfer2_piece_8b = split(chamfer2_piece_8b, bisect_by=Plane(origin=(87, 9.360103187, 7.535103187), z_dir=(1, 0, 0)), keep=Keep.TOP, mode=Mode.PRIVATE)
    chamfer2_piece_8 = chamfer2_piece_8a & chamfer2_piece_8b
    add(chamfer2_piece_8, mode=Mode.SUBTRACT)
    with BuildSketch(Plane(origin=(87, 9.525, 7.7), x_dir=(0, 0.0274958766105822, -0.999621916911297), z_dir=(-1, 0, 0))) as chamfer2_piece_9a_section:
        Polygon((CHAMFER2_SIZE * 0.999621916911, CHAMFER2_SIZE * 0.0274958766106), (-CHAMFER2_SIZE * 0.0274958766106, CHAMFER2_SIZE * 0.999621916911), (0, 0), align=None)
    chamfer2_piece_9a = extrude(amount=85.285841494, mode=Mode.PRIVATE)
    chamfer2_piece_9a = split(chamfer2_piece_9a, bisect_by=Plane(origin=(3, 9.360103187, 7.535103187), z_dir=(-1, 0, 0)), keep=Keep.TOP, mode=Mode.PRIVATE)
    with BuildSketch(Plane(origin=(3, 9.525, 6.414158506), x_dir=(-0.9996219169112968, 0.027495876610585623, -1.1837901526131803e-15), z_dir=(0, 0, 1))) as chamfer2_piece_9b_section:
        Polygon((CHAMFER2_SIZE * 0.999621916911, CHAMFER2_SIZE * 0.0274958766106), (-CHAMFER2_SIZE * 0.0274958766106, CHAMFER2_SIZE * 0.999621916911), (0, 0), align=None)
    chamfer2_piece_9b = extrude(amount=4.285841494, mode=Mode.PRIVATE)
    chamfer2_piece_9b = split(chamfer2_piece_9b, bisect_by=Plane(origin=(2.835103187, 9.360103187, 7.7), z_dir=(0, 0, -1)), keep=Keep.TOP, mode=Mode.PRIVATE)
    chamfer2_piece_9 = chamfer2_piece_9a & chamfer2_piece_9b
    add(chamfer2_piece_9, mode=Mode.SUBTRACT)
    with BuildSketch(Plane(origin=(1.714158506, 9.525, 10.7), x_dir=(0, 0.027495876610585647, 0.9996219169112968), z_dir=(1, 0, 0))) as chamfer2_piece_10a_section:
        Polygon((CHAMFER2_SIZE * 0.999621916911, CHAMFER2_SIZE * 0.0274958766106), (-CHAMFER2_SIZE * 0.0274958766106, CHAMFER2_SIZE * 0.999621916911), (0, 0), align=None)
    chamfer2_piece_10a = extrude(amount=85.285841494, mode=Mode.PRIVATE)
    chamfer2_piece_10a = split(chamfer2_piece_10a, bisect_by=Plane(origin=(3, 9.360103187, 10.864896813), z_dir=(-1, 0, 0)), keep=Keep.TOP, mode=Mode.PRIVATE)
    with BuildSketch(Plane(origin=(3, 9.525, 7.7), x_dir=(-0.9996219169112968, 0.027495876610585408, -1.1837901526131803e-15), z_dir=(0, 0, 1))) as chamfer2_piece_10b_section:
        Polygon((CHAMFER2_SIZE * 0.999621916911, CHAMFER2_SIZE * 0.0274958766106), (-CHAMFER2_SIZE * 0.0274958766106, CHAMFER2_SIZE * 0.999621916911), (0, 0), align=None)
    chamfer2_piece_10b = extrude(amount=4.285841494, mode=Mode.PRIVATE)
    chamfer2_piece_10b = split(chamfer2_piece_10b, bisect_by=Plane(origin=(2.835103187, 9.360103187, 10.7), z_dir=(0, 0, 1)), keep=Keep.TOP, mode=Mode.PRIVATE)
    chamfer2_piece_10 = chamfer2_piece_10a & chamfer2_piece_10b
    add(chamfer2_piece_10, mode=Mode.SUBTRACT)

    # Sketch11 → Cut-Extrude10 (cut)
    with BuildSketch(Plane(origin=(0, 9.525, 0), x_dir=(1, 0, 0), z_dir=(0, 1, 0))):
        with Locations(Location((85.5, -38, 0), (0, 0, 180))):
            Circle(SKETCH11_R)
        with Locations(Location((4.5, -38, 0), (0, 0, 180))):
            Circle(SKETCH11_R)
    extrude(amount=-CUT_EXTRUDE10_DEPTH, mode=Mode.SUBTRACT)


solid = part.part
